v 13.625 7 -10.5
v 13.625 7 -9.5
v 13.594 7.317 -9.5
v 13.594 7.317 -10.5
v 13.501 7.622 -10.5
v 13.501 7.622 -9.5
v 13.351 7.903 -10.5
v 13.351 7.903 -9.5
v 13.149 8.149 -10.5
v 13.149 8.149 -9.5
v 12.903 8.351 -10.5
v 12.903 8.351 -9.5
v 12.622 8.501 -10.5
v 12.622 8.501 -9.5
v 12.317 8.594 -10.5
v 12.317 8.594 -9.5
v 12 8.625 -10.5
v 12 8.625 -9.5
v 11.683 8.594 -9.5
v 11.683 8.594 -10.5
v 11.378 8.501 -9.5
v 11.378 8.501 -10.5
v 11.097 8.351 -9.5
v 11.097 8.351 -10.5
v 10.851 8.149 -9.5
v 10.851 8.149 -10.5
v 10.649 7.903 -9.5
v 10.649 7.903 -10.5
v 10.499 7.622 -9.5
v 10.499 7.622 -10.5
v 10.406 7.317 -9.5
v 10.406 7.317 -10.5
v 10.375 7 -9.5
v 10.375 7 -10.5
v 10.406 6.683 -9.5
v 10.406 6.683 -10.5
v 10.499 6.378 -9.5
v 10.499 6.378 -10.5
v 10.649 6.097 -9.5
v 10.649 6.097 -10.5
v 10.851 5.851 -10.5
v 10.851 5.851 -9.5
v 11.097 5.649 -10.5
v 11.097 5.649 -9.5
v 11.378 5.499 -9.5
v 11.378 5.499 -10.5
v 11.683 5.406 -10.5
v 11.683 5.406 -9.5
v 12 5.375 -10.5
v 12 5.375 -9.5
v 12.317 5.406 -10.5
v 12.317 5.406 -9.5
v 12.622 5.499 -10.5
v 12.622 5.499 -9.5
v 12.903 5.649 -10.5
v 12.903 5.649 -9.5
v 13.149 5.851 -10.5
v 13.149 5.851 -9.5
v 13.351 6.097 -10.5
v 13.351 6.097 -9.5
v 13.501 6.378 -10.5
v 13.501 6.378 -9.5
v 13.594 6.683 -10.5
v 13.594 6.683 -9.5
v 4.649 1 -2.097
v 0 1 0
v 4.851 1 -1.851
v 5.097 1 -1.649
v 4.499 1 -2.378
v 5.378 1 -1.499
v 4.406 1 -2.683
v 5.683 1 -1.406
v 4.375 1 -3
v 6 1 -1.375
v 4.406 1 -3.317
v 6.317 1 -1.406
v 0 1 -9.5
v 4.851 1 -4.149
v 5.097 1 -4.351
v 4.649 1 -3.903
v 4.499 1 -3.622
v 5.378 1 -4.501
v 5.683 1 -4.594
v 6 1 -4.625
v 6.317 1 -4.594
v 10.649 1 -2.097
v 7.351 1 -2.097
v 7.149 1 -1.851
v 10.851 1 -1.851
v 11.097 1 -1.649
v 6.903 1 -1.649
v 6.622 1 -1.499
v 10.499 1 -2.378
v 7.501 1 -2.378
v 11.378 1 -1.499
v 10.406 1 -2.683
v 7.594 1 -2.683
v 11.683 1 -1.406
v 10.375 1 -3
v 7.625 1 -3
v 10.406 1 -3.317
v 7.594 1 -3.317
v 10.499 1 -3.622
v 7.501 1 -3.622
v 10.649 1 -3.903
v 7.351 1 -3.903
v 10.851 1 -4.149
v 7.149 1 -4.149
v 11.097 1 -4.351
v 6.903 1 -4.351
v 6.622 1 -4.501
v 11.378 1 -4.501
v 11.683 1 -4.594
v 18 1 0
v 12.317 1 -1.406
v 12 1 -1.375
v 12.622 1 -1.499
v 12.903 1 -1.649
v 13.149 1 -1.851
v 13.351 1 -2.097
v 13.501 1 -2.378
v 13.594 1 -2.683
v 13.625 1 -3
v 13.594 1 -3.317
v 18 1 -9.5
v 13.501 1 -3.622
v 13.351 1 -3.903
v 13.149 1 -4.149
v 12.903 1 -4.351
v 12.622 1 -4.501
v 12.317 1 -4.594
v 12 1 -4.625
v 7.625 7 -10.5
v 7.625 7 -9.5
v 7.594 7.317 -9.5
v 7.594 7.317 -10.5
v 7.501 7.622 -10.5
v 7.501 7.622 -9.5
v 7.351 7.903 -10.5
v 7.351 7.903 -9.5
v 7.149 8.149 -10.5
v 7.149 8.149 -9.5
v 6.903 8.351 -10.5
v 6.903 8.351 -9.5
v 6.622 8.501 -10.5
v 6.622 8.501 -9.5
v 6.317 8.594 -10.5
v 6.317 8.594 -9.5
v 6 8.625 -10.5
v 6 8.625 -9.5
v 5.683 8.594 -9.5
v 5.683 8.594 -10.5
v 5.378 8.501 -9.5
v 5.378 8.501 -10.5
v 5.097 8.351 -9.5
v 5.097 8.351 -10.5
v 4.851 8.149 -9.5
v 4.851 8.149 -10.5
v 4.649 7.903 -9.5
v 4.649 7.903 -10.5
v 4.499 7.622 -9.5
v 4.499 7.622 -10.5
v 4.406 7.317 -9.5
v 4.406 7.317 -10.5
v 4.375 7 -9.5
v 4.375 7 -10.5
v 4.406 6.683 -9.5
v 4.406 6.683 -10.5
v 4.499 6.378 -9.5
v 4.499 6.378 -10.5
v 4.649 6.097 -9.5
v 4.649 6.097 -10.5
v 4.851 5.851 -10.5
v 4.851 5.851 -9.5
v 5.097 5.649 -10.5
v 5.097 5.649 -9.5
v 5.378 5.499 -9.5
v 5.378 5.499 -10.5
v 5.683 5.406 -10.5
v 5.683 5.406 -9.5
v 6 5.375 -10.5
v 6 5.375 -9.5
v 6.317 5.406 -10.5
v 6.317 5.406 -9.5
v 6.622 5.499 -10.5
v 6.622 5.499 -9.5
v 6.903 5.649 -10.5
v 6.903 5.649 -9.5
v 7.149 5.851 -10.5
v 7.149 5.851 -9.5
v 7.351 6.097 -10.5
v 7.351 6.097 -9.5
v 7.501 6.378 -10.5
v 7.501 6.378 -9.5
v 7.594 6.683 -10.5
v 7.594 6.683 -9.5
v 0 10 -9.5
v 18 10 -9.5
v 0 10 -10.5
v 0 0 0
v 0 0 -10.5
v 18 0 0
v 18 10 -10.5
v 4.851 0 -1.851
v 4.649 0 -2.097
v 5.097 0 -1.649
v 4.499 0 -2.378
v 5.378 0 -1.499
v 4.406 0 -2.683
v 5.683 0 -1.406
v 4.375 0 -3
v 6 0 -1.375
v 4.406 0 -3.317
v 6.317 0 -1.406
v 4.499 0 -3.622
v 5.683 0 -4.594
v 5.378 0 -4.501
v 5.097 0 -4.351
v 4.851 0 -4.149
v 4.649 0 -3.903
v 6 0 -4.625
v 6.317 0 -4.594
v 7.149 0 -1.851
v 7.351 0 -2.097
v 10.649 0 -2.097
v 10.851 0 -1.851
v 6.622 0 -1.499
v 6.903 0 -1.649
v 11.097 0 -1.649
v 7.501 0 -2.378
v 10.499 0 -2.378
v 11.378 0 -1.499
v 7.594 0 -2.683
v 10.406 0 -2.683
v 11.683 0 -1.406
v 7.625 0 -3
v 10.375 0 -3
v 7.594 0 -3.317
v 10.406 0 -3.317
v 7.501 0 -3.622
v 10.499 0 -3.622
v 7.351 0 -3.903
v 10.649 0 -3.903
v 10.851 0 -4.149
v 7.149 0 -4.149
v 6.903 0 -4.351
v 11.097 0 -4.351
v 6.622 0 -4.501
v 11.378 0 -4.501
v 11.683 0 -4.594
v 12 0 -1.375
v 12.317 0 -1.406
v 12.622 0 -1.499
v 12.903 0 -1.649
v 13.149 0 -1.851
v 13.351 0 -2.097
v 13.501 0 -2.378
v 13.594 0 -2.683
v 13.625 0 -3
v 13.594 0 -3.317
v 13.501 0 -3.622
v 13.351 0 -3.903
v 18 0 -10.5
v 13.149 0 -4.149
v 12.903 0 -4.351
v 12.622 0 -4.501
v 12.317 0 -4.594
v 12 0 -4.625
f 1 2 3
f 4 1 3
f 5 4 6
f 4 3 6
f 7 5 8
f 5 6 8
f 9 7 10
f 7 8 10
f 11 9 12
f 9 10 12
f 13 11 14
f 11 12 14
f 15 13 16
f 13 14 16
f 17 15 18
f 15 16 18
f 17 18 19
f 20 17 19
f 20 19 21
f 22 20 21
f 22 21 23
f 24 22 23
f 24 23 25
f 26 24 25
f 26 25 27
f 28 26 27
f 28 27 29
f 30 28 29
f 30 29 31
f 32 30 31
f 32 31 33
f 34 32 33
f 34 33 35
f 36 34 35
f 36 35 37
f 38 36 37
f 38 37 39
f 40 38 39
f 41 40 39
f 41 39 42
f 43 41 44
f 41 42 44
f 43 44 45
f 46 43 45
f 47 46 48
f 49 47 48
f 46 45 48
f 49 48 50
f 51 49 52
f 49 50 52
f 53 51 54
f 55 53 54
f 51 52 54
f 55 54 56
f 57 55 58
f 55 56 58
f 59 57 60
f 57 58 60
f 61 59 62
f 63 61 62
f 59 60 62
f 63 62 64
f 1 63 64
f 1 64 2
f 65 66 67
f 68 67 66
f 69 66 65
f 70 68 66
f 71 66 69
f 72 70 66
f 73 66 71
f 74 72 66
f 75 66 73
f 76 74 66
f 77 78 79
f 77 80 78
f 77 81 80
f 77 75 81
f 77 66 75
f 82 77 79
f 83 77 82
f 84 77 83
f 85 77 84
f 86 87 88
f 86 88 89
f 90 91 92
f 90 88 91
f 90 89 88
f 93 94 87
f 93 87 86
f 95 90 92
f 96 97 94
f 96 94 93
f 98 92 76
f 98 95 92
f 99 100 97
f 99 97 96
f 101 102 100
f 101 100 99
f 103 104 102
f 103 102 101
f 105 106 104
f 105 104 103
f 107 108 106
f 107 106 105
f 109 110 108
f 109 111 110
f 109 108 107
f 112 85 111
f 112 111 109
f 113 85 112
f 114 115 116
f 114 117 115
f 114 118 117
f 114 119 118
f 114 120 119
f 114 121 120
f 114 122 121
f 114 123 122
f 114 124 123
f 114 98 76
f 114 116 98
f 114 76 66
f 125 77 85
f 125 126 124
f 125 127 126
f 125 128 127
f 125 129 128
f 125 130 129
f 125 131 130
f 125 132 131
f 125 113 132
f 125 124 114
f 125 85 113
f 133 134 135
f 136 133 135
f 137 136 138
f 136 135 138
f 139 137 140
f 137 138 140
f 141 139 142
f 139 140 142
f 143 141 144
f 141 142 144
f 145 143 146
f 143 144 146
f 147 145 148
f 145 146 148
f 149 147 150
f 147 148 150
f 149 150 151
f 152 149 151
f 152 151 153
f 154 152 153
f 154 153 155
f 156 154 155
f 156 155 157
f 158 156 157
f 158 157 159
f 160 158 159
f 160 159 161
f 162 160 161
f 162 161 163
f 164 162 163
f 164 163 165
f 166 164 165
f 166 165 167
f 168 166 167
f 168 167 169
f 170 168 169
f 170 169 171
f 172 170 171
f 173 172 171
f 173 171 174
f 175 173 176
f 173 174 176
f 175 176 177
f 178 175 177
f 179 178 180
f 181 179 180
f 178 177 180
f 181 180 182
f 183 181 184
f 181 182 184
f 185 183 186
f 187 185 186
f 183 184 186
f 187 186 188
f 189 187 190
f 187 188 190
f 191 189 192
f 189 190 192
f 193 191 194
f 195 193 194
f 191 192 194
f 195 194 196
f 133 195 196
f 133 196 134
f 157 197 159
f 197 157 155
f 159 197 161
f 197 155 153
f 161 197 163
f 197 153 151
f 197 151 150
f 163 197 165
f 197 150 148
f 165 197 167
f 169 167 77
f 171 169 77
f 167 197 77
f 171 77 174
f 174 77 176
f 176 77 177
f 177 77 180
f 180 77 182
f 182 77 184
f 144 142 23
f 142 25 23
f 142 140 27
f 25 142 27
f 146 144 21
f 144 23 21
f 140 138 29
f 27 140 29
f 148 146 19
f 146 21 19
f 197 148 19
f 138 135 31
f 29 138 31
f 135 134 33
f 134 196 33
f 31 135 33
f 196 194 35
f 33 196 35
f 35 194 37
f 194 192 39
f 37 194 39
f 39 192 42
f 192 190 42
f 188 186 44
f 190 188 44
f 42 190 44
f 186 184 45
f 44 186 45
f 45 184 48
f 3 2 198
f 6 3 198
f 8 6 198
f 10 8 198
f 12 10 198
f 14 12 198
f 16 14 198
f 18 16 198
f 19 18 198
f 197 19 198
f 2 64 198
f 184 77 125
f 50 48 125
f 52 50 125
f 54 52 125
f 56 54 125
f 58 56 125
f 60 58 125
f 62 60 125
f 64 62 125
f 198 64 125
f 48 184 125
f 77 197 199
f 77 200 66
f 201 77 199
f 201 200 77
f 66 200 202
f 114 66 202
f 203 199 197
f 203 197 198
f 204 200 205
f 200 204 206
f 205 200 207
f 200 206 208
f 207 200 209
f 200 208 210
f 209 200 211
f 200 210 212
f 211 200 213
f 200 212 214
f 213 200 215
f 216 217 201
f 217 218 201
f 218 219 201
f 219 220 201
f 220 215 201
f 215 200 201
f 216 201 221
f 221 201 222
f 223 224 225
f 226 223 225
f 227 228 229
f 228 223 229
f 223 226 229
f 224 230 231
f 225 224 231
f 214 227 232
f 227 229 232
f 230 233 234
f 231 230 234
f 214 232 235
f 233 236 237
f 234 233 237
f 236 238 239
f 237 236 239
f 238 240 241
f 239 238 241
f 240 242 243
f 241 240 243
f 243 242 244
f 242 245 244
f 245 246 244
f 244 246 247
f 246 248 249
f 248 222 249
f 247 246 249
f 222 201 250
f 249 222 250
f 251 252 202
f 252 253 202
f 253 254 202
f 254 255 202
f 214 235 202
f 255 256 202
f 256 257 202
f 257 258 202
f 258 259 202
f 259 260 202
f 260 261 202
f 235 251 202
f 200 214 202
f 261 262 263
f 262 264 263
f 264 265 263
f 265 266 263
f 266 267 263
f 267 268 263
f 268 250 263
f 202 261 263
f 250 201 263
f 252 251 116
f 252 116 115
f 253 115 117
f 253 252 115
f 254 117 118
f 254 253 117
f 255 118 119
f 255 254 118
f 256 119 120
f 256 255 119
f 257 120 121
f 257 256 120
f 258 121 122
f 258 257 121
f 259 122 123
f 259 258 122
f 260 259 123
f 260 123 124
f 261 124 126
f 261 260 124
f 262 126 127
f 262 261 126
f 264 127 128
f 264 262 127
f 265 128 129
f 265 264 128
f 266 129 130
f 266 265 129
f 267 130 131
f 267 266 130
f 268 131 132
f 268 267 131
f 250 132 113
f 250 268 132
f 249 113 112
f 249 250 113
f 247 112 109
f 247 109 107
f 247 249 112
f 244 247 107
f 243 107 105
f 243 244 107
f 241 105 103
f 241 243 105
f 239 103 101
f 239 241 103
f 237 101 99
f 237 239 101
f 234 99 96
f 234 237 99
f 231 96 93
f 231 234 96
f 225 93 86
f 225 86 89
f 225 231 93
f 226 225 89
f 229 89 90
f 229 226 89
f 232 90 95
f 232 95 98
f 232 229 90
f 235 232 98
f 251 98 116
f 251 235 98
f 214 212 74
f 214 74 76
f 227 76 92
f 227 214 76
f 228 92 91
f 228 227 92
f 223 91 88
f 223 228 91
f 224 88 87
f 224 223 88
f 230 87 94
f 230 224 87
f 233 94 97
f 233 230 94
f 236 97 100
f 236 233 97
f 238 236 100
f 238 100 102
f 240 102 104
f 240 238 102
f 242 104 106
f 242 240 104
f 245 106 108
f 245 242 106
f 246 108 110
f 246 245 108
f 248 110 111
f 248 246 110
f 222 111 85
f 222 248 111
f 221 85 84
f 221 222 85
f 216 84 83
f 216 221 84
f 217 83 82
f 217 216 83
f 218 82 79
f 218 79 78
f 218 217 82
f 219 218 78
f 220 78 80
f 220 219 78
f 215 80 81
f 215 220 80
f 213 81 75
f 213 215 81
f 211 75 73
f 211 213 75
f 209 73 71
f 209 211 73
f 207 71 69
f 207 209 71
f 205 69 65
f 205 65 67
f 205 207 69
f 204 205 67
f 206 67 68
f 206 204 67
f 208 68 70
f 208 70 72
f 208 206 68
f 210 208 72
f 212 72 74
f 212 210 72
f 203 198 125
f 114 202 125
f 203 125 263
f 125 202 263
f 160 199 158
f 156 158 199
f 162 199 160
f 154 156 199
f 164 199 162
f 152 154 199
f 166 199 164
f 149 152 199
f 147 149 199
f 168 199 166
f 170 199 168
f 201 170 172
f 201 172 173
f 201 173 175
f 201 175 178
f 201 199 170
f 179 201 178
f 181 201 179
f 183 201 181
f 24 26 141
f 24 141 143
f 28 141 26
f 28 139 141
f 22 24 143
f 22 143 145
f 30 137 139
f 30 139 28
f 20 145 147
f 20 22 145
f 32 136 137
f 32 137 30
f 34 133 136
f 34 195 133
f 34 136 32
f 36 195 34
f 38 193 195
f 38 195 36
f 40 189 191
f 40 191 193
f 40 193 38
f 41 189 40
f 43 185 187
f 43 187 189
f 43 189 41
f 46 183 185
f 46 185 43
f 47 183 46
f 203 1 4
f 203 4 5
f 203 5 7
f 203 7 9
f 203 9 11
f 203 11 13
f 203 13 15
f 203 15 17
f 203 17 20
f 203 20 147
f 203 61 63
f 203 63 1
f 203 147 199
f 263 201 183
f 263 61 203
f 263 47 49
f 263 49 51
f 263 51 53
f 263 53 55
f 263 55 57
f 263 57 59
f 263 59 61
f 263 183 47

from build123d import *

# Parameters (mm, degrees)
SKETCH1_W           = 18
SKETCH1_H           = 10.5
SKETCH1_R           = 1.625
BOSS_EXTRUDE1_DEPTH = 1
SKETCH2_W           = 18
SKETCH2_H           = 1
BOSS_EXTRUDE2_DEPTH = 9
SKETCH4_R           = 1.625
CUT_EXTRUDE1_DEPTH  = 23.677080941


with BuildPart() as part:
    # Sketch1 → Boss-Extrude1 (new body)
    with BuildSketch(Plane(origin=(0, 0, 0), x_dir=(1, 0, 0), z_dir=(0, 1, 0))):
        with Locations((9, 5.25)):
            Rectangle(SKETCH1_W, SKETCH1_H)
        with Locations(Location((6, 3, 0), (0, 0, 270))):
            Circle(SKETCH1_R, mode=Mode.SUBTRACT)
        with Locations(Location((12, 3, 0), (0, 0, 270))):
            Circle(SKETCH1_R, mode=Mode.SUBTRACT)
    extrude(amount=BOSS_EXTRUDE1_DEPTH)

    # Sketch2 → Boss-Extrude2 (add)
    with BuildSketch(Plane(origin=(0, 1, 0), x_dir=(1, 0, 0), z_dir=(0, 1, 0))):
        with Locations((9, 10)):
            Rectangle(SKETCH2_W, SKETCH2_H)
    extrude(amount=BOSS_EXTRUDE2_DEPTH)

    # Sketch4 → Cut-Extrude1 (cut, through all)
    with BuildSketch(Plane.XY.offset(-9.5)):
        with Locations((6, 7)):
            Circle(SKETCH4_R)
        with Locations((12, 7)):
            Circle(SKETCH4_R)
    extrude(amount=-CUT_EXTRUDE1_DEPTH, mode=Mode.SUBTRACT)


solid = part.part
